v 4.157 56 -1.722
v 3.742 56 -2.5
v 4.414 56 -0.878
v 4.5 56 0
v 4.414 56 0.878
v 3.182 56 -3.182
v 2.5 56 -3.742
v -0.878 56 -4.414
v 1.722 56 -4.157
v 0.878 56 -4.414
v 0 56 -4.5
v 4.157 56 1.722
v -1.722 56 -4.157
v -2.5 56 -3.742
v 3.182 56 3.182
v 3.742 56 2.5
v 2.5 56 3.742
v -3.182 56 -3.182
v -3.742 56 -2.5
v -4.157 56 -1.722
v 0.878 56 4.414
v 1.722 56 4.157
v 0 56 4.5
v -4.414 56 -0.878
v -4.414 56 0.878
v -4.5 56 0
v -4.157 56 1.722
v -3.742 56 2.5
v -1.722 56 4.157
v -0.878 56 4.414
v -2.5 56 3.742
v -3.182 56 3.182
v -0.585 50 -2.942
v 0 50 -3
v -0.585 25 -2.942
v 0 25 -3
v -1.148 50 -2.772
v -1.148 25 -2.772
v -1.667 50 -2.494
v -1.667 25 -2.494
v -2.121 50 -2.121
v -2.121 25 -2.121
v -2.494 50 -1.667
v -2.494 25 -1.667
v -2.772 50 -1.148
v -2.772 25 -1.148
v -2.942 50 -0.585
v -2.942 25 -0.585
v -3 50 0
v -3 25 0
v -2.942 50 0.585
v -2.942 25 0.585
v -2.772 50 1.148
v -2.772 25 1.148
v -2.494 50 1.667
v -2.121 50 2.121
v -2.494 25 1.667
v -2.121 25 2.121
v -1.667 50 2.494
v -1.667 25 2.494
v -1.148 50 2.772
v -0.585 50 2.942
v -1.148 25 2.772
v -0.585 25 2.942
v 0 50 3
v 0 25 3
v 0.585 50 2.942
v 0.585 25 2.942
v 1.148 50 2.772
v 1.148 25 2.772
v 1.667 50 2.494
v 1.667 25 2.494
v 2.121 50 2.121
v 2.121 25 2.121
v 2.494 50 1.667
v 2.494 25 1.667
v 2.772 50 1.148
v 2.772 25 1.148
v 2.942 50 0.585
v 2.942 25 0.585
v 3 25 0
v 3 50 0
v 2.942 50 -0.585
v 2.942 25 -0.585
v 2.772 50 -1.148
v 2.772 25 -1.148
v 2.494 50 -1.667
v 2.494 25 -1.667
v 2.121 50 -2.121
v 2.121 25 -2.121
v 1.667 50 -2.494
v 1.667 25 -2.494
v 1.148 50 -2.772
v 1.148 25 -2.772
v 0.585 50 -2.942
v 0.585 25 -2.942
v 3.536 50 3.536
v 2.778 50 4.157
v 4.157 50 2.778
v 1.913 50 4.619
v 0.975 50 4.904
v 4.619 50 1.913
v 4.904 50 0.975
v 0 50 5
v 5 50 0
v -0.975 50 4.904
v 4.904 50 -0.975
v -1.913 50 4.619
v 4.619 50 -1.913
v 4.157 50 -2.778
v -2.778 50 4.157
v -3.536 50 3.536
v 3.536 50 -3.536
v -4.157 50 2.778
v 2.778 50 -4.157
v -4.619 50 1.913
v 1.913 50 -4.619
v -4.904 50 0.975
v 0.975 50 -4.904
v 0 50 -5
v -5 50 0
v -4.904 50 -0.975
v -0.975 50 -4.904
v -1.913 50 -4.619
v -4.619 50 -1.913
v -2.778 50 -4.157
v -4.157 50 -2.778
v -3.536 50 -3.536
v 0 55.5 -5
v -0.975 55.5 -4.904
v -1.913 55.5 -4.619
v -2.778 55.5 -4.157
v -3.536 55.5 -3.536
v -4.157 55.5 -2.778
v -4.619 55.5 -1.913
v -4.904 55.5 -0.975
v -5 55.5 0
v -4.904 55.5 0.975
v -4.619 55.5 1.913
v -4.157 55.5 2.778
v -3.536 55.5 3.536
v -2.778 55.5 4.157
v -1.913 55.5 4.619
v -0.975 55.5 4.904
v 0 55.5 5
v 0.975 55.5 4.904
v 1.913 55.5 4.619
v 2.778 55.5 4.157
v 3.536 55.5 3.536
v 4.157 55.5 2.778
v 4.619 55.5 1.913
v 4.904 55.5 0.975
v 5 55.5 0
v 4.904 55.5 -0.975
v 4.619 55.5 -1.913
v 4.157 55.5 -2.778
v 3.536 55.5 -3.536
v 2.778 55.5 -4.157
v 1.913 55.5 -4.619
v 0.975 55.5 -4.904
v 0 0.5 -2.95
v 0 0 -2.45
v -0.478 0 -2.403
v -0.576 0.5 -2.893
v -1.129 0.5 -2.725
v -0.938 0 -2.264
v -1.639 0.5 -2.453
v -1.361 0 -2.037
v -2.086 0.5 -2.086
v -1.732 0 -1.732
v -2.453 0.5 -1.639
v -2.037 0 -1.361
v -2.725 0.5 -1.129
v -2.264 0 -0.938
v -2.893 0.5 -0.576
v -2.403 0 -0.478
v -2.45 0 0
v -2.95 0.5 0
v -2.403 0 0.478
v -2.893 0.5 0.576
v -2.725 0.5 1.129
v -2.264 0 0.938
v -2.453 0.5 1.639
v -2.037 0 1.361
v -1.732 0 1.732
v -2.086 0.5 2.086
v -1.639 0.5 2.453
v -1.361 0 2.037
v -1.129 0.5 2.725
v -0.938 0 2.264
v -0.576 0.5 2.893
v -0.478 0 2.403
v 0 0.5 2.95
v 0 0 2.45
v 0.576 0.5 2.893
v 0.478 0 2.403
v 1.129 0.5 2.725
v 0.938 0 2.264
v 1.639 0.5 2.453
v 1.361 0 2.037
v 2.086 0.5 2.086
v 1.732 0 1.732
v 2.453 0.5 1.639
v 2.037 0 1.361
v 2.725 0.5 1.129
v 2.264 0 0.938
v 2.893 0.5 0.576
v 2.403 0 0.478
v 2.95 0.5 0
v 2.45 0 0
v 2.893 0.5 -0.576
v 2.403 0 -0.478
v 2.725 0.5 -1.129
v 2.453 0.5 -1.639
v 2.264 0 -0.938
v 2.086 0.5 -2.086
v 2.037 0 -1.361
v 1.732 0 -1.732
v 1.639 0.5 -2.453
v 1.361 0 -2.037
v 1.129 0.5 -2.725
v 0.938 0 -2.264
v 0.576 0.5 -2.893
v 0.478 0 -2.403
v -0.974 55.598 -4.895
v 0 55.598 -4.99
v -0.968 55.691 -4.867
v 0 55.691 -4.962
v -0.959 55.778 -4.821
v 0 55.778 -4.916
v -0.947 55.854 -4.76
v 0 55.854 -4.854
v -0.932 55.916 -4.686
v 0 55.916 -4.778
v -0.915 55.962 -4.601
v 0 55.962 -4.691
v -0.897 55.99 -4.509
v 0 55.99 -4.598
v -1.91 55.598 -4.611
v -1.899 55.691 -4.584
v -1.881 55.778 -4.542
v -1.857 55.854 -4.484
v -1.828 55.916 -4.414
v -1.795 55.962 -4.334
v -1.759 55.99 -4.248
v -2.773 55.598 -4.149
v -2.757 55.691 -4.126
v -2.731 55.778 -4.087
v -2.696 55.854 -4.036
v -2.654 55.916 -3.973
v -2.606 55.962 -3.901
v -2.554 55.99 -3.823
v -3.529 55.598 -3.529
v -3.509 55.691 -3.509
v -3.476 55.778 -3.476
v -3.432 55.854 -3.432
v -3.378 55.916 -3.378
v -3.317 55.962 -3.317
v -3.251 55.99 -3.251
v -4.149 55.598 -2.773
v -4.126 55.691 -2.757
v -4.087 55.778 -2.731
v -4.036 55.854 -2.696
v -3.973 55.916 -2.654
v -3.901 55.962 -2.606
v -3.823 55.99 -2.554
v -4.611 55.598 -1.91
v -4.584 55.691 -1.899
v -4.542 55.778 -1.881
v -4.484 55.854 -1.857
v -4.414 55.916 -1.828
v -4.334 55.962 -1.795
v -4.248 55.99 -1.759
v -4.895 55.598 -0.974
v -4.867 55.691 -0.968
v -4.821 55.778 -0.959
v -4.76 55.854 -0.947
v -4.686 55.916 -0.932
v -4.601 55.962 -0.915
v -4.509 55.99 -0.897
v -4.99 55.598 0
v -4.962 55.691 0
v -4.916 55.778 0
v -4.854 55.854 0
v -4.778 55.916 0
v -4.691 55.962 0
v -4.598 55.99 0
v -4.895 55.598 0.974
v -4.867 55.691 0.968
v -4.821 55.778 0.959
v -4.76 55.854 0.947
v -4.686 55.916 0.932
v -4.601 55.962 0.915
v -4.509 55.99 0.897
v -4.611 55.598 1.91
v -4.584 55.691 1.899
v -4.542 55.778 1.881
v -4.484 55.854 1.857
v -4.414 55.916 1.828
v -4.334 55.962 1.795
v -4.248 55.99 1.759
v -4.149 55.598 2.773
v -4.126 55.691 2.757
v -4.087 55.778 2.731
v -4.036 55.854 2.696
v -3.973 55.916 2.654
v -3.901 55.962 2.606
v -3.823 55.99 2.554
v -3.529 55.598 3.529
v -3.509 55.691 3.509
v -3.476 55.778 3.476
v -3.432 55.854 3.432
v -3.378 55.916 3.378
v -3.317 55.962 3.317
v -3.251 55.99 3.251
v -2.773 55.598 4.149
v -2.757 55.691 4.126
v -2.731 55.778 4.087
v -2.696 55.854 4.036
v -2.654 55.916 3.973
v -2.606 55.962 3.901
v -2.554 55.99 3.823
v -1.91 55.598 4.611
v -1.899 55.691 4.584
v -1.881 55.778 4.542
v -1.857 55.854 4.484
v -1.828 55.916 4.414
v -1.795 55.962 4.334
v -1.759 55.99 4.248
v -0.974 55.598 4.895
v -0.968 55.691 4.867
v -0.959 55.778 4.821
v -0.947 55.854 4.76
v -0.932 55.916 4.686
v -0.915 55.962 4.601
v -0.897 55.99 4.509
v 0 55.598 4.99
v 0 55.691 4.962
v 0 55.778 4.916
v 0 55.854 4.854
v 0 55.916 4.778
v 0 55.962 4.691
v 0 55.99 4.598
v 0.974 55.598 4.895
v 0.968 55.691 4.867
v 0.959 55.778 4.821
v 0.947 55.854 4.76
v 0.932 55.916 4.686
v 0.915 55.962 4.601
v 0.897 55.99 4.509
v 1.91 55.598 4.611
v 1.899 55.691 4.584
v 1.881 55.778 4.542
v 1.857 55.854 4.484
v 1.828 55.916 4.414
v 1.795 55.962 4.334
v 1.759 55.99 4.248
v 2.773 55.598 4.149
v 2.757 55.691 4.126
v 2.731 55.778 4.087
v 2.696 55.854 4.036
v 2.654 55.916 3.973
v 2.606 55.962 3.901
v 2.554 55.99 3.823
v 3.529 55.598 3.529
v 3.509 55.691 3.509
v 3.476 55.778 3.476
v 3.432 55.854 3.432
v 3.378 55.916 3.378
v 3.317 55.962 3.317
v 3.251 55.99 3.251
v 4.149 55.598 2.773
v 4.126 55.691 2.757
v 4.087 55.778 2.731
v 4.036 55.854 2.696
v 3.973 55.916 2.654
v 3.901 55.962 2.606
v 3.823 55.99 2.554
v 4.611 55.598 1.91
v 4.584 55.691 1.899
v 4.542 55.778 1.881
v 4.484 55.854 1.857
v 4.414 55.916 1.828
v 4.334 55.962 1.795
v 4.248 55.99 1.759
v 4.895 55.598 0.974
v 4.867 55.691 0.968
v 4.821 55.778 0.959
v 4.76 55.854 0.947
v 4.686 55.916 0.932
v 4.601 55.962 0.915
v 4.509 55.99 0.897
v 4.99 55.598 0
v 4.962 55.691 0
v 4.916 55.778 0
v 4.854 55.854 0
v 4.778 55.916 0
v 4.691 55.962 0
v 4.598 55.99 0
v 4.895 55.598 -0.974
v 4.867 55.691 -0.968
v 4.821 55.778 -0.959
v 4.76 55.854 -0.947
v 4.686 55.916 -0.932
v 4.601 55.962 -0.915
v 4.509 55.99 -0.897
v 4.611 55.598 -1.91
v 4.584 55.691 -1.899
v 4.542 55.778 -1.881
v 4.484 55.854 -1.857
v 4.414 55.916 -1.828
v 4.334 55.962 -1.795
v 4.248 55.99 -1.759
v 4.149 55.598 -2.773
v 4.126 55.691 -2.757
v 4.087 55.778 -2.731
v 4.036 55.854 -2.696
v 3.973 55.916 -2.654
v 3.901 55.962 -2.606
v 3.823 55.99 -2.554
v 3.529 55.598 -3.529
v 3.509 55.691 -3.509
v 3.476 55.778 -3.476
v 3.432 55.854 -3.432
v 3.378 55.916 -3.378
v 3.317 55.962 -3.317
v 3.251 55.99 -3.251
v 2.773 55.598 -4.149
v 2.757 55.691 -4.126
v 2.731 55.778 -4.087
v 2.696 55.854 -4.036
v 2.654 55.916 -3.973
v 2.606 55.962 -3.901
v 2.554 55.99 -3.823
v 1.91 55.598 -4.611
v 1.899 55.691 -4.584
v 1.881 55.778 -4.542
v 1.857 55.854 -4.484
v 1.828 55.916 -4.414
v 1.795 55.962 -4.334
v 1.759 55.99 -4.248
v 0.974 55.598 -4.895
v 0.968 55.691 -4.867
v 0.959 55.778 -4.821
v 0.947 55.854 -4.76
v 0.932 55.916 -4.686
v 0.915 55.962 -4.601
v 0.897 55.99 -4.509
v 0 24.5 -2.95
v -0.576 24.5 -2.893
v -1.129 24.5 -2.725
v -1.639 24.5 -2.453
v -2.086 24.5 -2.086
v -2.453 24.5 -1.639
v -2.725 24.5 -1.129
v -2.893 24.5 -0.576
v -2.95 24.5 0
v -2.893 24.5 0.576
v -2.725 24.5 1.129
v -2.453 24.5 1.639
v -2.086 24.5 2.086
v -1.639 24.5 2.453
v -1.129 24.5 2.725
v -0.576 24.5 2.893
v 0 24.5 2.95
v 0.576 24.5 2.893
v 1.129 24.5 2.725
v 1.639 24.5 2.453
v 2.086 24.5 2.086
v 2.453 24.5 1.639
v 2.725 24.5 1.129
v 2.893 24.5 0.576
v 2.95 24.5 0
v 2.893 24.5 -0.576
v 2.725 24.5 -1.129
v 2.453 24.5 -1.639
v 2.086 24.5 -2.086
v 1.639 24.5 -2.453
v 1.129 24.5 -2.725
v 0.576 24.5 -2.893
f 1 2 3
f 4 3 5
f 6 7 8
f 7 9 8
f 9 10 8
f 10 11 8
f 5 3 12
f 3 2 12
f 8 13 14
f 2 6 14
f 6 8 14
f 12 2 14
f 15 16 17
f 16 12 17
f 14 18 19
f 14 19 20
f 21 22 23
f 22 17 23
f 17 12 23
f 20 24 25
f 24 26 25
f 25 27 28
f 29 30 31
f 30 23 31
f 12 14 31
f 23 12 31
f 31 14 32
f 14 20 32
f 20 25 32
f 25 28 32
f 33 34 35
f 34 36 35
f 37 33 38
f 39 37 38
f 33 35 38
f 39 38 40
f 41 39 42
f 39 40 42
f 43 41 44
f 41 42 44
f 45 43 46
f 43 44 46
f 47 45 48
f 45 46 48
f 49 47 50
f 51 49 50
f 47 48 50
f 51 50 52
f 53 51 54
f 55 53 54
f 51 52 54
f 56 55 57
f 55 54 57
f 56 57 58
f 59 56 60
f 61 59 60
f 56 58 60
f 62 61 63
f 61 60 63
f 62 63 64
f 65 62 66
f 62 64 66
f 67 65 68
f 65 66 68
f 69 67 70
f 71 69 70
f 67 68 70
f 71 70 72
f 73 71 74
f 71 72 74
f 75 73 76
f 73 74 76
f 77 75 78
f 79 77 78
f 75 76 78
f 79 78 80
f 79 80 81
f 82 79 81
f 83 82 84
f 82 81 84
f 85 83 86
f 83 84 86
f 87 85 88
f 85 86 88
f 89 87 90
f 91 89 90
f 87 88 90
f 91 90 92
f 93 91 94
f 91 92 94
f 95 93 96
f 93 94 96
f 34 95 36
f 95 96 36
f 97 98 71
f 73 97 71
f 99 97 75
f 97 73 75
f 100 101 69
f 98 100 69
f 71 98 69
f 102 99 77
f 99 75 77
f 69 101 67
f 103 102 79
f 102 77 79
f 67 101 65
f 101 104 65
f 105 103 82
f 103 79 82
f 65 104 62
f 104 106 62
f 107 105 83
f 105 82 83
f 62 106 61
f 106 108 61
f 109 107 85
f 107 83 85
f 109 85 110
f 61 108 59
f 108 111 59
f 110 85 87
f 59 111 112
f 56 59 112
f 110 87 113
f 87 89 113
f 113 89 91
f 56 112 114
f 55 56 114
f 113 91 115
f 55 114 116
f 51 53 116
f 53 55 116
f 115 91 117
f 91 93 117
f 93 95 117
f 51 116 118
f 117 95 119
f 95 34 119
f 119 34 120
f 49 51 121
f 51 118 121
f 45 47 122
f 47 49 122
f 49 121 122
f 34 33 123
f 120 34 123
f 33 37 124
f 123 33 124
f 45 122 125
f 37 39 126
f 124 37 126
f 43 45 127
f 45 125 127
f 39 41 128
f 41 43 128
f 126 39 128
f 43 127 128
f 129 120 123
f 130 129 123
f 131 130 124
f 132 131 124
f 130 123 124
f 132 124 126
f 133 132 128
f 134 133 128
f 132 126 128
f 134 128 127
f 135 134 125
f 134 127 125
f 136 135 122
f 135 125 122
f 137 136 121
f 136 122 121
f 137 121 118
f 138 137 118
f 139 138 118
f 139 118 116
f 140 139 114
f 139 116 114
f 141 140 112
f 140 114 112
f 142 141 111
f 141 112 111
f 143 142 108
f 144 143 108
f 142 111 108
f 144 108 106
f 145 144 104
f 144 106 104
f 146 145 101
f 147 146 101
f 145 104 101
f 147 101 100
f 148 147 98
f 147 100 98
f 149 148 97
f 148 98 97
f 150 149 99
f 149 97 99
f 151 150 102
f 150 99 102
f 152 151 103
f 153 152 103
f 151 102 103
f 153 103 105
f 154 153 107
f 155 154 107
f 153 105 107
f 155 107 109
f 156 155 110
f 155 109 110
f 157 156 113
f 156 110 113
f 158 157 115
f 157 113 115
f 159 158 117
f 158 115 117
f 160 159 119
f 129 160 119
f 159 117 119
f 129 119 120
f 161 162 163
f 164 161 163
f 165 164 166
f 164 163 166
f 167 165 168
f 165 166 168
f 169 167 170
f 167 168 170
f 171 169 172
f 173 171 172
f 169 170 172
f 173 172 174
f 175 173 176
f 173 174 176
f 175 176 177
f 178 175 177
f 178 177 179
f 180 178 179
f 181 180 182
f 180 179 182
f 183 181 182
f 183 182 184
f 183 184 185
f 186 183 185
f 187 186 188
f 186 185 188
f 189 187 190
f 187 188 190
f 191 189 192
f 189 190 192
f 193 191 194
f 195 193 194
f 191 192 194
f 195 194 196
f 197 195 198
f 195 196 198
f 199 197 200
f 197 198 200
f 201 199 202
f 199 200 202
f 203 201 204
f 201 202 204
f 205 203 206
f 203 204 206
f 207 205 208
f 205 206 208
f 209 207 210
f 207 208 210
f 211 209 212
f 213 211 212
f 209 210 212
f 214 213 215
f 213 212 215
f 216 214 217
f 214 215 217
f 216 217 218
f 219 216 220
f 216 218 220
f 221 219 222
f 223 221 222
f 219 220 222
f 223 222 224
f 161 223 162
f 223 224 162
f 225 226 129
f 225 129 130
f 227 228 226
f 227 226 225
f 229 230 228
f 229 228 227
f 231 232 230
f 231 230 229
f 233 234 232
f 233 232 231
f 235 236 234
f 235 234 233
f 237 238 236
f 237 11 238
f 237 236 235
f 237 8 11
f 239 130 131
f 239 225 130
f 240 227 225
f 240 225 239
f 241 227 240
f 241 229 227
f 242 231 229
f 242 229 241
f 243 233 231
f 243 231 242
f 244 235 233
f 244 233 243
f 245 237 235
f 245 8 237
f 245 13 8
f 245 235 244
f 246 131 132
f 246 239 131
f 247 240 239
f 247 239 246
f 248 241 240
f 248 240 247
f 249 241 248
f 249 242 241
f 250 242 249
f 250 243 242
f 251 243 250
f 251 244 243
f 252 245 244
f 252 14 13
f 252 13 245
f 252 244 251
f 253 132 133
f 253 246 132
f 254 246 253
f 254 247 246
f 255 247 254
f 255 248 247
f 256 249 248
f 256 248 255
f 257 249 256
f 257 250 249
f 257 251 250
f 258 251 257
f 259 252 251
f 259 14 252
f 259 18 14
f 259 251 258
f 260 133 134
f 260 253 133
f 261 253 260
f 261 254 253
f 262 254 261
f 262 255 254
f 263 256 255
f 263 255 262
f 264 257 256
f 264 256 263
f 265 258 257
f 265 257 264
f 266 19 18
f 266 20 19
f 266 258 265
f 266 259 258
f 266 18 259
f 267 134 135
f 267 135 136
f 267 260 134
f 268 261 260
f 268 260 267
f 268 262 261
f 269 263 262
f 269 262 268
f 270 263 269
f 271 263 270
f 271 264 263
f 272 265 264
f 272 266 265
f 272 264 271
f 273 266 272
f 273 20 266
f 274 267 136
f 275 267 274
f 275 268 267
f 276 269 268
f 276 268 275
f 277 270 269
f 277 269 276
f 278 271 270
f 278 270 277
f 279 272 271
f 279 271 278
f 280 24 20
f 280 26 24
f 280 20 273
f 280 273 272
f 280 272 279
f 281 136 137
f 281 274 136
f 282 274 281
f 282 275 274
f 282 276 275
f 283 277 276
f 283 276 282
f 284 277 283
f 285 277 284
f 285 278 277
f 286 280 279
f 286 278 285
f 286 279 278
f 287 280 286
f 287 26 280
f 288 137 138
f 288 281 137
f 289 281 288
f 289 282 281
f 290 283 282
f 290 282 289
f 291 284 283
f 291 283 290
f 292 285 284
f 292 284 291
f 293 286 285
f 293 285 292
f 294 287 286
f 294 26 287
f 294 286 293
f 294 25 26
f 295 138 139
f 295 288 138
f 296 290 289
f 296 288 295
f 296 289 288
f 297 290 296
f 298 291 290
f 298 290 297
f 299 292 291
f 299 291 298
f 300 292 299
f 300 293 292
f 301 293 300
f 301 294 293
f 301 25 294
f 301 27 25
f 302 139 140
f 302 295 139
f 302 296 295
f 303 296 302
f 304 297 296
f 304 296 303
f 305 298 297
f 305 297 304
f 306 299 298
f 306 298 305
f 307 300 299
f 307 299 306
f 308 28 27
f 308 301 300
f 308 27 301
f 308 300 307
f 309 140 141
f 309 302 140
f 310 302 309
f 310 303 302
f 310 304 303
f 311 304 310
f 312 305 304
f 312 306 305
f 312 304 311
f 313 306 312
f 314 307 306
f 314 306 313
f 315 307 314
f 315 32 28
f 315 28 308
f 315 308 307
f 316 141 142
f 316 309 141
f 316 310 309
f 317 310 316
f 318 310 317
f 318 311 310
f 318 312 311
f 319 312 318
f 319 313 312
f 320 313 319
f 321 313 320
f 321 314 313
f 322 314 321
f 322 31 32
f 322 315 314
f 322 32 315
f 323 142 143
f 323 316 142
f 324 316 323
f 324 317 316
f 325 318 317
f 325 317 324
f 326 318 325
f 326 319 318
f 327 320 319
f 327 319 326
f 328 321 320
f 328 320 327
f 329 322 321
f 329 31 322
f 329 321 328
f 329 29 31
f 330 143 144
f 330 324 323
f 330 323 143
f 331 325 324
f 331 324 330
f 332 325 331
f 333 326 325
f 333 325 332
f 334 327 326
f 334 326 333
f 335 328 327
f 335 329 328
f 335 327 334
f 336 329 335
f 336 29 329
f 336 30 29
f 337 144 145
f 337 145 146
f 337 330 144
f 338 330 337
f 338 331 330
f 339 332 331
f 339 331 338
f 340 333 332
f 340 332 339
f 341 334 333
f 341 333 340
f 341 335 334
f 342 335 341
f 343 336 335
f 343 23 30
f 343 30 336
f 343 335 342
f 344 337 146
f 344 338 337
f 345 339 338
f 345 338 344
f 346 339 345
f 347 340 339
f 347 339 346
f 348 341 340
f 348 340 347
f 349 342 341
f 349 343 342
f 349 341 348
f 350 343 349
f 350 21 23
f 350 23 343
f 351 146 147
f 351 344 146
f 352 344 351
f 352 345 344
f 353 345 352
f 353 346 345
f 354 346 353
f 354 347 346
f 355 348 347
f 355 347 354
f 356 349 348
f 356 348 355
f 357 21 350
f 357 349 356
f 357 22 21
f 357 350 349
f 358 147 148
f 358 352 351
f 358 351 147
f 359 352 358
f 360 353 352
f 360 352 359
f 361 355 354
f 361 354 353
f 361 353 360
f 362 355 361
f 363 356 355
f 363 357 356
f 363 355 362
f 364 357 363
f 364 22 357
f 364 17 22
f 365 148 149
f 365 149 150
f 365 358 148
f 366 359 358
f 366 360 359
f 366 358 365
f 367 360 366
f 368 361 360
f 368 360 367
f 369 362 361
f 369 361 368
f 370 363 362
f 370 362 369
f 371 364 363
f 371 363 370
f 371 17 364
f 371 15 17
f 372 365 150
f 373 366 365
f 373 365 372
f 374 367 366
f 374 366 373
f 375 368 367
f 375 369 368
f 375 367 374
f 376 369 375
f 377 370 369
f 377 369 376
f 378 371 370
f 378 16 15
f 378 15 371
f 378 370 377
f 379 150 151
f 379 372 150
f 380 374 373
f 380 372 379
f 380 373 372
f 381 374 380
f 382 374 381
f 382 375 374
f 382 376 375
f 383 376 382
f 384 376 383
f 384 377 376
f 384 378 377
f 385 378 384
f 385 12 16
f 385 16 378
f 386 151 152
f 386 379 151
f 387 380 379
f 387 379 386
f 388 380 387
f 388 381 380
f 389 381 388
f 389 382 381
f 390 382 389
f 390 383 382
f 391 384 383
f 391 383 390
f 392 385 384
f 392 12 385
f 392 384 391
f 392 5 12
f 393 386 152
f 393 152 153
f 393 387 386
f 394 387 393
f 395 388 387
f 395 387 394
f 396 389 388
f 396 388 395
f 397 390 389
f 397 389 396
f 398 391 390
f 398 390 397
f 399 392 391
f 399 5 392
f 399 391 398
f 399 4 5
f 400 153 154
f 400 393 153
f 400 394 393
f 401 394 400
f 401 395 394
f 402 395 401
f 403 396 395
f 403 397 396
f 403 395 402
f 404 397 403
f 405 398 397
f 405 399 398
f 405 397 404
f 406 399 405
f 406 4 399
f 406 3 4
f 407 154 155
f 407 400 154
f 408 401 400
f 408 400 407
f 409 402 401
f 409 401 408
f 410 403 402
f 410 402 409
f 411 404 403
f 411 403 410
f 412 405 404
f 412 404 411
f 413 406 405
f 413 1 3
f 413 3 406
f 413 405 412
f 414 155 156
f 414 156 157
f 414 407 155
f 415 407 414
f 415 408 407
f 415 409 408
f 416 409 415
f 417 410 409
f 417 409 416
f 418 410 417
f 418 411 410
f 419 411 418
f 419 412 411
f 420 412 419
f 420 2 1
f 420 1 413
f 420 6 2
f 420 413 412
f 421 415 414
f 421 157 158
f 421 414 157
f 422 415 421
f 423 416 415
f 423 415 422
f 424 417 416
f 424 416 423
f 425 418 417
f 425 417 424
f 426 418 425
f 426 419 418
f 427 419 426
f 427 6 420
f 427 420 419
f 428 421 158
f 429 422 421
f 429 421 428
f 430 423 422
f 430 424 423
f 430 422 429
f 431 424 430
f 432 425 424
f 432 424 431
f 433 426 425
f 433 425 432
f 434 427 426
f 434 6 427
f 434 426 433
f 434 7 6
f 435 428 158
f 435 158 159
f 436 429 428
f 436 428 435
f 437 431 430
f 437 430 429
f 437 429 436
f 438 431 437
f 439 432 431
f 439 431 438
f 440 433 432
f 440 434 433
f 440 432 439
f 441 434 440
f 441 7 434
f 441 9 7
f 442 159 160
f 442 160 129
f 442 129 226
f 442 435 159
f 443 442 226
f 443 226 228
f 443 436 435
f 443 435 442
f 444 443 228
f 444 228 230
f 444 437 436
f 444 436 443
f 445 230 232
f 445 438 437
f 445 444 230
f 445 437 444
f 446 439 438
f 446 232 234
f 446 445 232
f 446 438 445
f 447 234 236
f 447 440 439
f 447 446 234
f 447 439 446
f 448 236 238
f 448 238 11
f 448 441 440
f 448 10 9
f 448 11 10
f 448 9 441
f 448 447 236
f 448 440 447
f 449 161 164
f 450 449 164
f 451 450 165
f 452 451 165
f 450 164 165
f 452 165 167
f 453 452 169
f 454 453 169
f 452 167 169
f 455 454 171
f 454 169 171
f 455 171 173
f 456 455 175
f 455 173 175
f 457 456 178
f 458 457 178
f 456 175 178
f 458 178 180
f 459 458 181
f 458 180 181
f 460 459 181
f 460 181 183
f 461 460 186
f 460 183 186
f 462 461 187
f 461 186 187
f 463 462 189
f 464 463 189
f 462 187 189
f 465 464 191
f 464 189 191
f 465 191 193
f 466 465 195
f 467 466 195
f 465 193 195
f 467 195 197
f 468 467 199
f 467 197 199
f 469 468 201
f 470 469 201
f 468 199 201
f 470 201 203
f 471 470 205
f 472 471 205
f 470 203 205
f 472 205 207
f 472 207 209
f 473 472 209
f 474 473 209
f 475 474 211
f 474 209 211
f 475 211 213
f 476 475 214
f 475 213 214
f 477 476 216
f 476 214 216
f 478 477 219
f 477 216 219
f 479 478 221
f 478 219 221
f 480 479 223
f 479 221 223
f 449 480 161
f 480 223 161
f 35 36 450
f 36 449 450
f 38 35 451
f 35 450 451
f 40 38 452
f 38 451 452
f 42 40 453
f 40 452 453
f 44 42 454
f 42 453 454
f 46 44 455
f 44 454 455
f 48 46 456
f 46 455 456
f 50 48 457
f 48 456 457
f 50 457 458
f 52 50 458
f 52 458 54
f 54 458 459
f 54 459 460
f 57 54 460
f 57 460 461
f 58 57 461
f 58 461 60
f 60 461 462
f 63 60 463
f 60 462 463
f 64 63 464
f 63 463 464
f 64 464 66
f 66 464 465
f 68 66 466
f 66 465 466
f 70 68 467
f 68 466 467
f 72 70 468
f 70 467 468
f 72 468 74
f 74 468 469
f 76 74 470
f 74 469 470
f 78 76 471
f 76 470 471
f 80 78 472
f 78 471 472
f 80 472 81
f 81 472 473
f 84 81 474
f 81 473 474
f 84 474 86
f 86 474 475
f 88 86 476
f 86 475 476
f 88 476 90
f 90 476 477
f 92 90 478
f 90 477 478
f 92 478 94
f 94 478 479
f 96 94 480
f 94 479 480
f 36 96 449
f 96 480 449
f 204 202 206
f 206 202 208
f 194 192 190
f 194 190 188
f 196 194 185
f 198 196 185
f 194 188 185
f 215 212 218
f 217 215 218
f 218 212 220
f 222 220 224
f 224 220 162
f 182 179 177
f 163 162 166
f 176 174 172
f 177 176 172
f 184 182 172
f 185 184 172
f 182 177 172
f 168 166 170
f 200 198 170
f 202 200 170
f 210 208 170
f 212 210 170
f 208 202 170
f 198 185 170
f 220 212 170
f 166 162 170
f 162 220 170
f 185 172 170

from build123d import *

# Parameters (mm, degrees)
CHANFREIN1_SIZE = 0.5
CONG_1_R        = 0.5


with BuildPart() as part:
    # Esquisse1 → Révolution1 (revolve)
    with BuildSketch(Plane.XY, mode=Mode.PRIVATE) as r_volution1_sk:
        Polygon((0, 56), (5, 56), (5, 50), (3, 50), (3, 25), (2.95, 24.5), (2.95, 0), (0, 0), align=None)
    revolve(r_volution1_sk.sketch.rotate(Axis((0, 0, 0), (0, 1, 0)), 90), axis=Axis((0, 0, 0), (0, 1, 0)))

    # Chanfrein1
    chanfrein1_edges = [part.edges().sort_by_distance(p)[0] for p in [
        (0, 0, 2.95),
    ]]
    chamfer(chanfrein1_edges, length=CHANFREIN1_SIZE)

    # Congé1
    cong_1_edges = [part.edges().sort_by_distance(p)[0] for p in [
        (0, 56, 5),
    ]]
    fillet(cong_1_edges, radius=CONG_1_R)


solid = part.part
